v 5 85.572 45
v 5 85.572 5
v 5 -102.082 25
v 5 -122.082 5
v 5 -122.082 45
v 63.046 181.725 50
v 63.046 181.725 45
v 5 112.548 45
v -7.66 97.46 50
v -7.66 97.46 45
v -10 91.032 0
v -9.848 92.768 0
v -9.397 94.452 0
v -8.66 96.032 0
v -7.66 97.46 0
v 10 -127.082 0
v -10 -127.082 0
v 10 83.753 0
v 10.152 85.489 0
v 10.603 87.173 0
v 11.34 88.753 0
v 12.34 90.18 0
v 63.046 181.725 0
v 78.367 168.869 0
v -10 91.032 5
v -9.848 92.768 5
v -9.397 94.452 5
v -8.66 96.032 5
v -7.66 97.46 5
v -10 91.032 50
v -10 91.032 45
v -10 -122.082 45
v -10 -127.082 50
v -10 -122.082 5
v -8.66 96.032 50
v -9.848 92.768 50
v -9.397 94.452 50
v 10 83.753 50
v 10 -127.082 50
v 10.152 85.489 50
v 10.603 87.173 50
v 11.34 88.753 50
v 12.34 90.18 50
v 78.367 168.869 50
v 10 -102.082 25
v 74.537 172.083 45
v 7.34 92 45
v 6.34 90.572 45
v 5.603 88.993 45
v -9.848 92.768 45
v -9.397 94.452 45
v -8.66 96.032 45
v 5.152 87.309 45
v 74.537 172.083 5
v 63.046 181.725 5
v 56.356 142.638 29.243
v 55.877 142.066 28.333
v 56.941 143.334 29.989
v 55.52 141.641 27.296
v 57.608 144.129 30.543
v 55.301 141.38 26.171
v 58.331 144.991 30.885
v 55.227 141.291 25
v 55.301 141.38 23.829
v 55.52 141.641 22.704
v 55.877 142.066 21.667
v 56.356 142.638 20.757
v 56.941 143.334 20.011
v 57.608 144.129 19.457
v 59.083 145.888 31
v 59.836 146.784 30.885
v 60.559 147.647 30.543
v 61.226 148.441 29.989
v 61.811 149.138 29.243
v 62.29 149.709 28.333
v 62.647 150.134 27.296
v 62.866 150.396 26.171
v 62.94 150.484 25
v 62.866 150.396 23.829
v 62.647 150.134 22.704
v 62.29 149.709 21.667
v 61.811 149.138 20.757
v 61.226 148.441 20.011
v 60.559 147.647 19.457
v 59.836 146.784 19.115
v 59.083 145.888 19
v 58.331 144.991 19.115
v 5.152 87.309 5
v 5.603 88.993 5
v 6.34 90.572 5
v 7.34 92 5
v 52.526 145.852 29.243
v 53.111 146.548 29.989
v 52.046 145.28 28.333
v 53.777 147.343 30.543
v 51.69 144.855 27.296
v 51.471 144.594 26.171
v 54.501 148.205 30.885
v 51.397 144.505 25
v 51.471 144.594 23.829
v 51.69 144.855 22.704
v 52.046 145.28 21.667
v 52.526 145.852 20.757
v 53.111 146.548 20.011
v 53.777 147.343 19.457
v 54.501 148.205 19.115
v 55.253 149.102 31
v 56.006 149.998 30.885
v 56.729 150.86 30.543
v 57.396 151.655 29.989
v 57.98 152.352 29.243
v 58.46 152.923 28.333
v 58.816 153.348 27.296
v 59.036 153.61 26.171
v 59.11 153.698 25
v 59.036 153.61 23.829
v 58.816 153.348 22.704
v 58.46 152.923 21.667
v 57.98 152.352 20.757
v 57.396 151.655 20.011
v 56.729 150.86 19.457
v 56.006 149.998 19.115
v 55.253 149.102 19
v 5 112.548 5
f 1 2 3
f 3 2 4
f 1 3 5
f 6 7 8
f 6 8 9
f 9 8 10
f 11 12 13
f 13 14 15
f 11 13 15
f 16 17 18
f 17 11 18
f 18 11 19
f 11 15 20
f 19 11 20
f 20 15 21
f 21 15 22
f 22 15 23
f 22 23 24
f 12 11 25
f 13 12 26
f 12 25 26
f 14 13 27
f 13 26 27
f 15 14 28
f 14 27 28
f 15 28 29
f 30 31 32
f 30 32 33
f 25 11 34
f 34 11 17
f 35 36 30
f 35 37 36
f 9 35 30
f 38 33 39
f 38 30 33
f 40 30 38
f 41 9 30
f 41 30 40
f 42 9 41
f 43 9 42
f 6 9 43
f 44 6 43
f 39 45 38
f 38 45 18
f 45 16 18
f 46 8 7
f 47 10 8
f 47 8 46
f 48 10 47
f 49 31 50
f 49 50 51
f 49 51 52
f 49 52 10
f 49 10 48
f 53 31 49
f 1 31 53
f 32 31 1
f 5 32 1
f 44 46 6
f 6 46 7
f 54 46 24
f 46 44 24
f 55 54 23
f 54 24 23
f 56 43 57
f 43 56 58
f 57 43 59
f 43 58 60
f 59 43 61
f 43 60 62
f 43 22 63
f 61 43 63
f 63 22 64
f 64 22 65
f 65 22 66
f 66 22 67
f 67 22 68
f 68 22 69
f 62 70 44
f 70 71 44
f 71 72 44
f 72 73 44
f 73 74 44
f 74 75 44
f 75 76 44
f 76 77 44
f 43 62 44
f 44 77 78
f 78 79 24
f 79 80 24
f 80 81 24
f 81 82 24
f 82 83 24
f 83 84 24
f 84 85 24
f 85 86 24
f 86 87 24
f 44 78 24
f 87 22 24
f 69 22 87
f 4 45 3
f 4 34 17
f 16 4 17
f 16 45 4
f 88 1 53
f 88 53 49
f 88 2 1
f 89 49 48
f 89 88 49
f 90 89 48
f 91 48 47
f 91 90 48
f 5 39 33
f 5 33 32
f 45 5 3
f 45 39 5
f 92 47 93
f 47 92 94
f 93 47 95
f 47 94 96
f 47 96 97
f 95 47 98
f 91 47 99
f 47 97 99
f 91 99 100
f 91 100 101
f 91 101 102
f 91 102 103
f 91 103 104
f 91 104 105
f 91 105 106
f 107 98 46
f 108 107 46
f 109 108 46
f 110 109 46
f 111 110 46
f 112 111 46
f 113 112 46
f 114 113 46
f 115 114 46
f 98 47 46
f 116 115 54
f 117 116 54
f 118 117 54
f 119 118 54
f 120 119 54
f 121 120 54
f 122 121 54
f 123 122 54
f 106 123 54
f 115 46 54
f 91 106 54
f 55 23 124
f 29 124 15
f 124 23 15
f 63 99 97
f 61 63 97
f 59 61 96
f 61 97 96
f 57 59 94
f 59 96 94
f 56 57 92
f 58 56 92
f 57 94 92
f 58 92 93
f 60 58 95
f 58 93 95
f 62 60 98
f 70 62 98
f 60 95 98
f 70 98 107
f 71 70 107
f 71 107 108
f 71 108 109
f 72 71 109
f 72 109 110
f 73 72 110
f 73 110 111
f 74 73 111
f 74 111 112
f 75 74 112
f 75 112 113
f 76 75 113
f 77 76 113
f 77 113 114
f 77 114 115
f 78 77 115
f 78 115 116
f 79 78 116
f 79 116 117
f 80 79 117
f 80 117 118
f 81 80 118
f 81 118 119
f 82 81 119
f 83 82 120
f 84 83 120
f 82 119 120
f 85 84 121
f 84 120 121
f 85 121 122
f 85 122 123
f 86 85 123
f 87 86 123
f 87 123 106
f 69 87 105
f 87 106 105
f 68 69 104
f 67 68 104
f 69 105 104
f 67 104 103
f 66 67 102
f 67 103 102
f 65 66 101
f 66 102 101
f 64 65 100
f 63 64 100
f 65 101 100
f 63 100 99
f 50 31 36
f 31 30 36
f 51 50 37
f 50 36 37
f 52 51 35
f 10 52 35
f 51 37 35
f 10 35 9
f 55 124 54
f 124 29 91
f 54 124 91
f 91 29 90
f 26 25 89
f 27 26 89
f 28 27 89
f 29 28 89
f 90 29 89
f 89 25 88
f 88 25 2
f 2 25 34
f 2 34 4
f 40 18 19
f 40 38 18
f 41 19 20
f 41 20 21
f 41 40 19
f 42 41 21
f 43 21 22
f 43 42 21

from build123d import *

# Parameters (mm, degrees)
BOSS_EXTRUDE1_DEPTH = 50
CUT_EXTRUDE1_REACH  = 338.776
SKETCH2_W           = 15
SKETCH2_H           = 40
CUT_EXTRUDE2_REACH  = 312.586
SKETCH3_W           = 15
SKETCH3_H           = 40
FILLET1_R           = 10
CUT_EXTRUDE3_REACH  = 210.165
CUT_EXTRUDE8_REACH  = 220.751
SKETCH7_R           = 6
CUT_EXTRUDE9_START  = -20
CUT_EXTRUDE9_DEPTH  = 20


with BuildPart() as part:
    # Sketch1 → Boss-Extrude1 (new body)
    with BuildSketch(Plane.XY):
        Polygon((10, -141.968058968), (10, 87.392238689), (78.367081497, 168.868953678), (63.046192634, 181.724705872), (-10, 94.671643375), (-10, -141.968058968), align=None)
    extrude(amount=BOSS_EXTRUDE1_DEPTH)

    # Cut-Extrude1: up to this plane
    cut_extrude1_end = Plane(origin=(-10, 94.671643375, 50), z_dir=(0.7660444431189772, -0.6427876096865403, 0))
    # Sketch2 → Cut-Extrude1 (cut, up to the surface)
    with BuildSketch(Plane.XZ.offset(141.968058968), mode=Mode.PRIVATE) as cut_extrude1_sk1:
        with Locations((-2.5, 25)):
            Rectangle(SKETCH2_W, SKETCH2_H)
    cut_extrude1_tool1 = split(extrude(cut_extrude1_sk1.sketch, amount=-CUT_EXTRUDE1_REACH, mode=Mode.PRIVATE), bisect_by=cut_extrude1_end, keep=Keep.BOTH, mode=Mode.PRIVATE)
    add(cut_extrude1_tool1.solids().sort_by_distance((-2.5, -141.968059, 25))[0], mode=Mode.SUBTRACT)

    # Cut-Extrude2: up to this plane
    cut_extrude2_end = Plane(origin=(5, 181.726705872, 45), z_dir=(-1, 0, 0))
    # Sketch3 → Cut-Extrude2 (cut, up to the surface)
    with BuildSketch(Plane(origin=(115.531117716, 137.684624594, 0), x_dir=(0.766044443118977, -0.6427876096865407, 0), z_dir=(0.6427876096865407, 0.766044443118977, 0)), mode=Mode.PRIVATE) as cut_extrude2_sk1:
        with Locations((-61.014203781, -25)):
            Rectangle(SKETCH3_W, SKETCH3_H)
    cut_extrude2_tool1 = split(extrude(cut_extrude2_sk1.sketch, amount=-CUT_EXTRUDE2_REACH, mode=Mode.PRIVATE), bisect_by=cut_extrude2_end, keep=Keep.BOTH, mode=Mode.PRIVATE)
    add(cut_extrude2_tool1.solids().sort_by_distance((68.791526, 176.903799, 25))[0], mode=Mode.SUBTRACT)

    # Fillet1
    fillet1_edges = [part.edges().sort_by_distance(p)[0] for p in [
        (-10, 94.671643375, 47.5),
        (10, 87.392238689, 25),
        (-10, 94.671643375, 2.5),
        (5, 89.212089861, 25),
    ]]
    fillet(fillet1_edges, radius=FILLET1_R)

    # Sketch4 → Cut-Extrude3 (cut, up to next)
    with BuildSketch(Plane.ZY.offset(10), mode=Mode.PRIVATE) as cut_extrude3_sk1:
        Polygon((0, -141.968058968), (25, -102.081750499), (50, -141.968058968), align=None)
    cut_extrude3_tool1 = extrude(cut_extrude3_sk1.sketch, amount=-CUT_EXTRUDE3_REACH, mode=Mode.PRIVATE) & part.part
    add(cut_extrude3_tool1.solids().sort_by_distance((-10, -128.672623, 25))[0], mode=Mode.SUBTRACT)

    # Sketch7 → Cut-Extrude8 (cut, up to next)
    with BuildSketch(Plane(origin=(-40.994258434, 34.398267133, 0), x_dir=(0, 0, 1), z_dir=(-0.766044443118977, 0.6427876096865406, 0)), mode=Mode.PRIVATE) as cut_extrude8_sk1:
        with Locations(Location((25, 149.734512574, 0), (0, 0, 270))):
            Circle(SKETCH7_R)
    cut_extrude8_tool1 = extrude(cut_extrude8_sk1.sketch, amount=-CUT_EXTRUDE8_REACH, mode=Mode.PRIVATE) & part.part
    add(cut_extrude8_tool1.solids().sort_by_distance((55.253231, 149.101558, 25))[0], mode=Mode.SUBTRACT)

    # Sketch10 → Cut-Extrude9 (cut)
    with BuildSketch(Plane.ZY.offset(10).offset(CUT_EXTRUDE9_START)):
        Polygon((50, -127.0817505), (25, -102.081750499), (0, -127.081750499), (0, -141.968058968), (50, -141.968058968), align=None)
    extrude(amount=CUT_EXTRUDE9_DEPTH, mode=Mode.SUBTRACT)


solid = part.part
